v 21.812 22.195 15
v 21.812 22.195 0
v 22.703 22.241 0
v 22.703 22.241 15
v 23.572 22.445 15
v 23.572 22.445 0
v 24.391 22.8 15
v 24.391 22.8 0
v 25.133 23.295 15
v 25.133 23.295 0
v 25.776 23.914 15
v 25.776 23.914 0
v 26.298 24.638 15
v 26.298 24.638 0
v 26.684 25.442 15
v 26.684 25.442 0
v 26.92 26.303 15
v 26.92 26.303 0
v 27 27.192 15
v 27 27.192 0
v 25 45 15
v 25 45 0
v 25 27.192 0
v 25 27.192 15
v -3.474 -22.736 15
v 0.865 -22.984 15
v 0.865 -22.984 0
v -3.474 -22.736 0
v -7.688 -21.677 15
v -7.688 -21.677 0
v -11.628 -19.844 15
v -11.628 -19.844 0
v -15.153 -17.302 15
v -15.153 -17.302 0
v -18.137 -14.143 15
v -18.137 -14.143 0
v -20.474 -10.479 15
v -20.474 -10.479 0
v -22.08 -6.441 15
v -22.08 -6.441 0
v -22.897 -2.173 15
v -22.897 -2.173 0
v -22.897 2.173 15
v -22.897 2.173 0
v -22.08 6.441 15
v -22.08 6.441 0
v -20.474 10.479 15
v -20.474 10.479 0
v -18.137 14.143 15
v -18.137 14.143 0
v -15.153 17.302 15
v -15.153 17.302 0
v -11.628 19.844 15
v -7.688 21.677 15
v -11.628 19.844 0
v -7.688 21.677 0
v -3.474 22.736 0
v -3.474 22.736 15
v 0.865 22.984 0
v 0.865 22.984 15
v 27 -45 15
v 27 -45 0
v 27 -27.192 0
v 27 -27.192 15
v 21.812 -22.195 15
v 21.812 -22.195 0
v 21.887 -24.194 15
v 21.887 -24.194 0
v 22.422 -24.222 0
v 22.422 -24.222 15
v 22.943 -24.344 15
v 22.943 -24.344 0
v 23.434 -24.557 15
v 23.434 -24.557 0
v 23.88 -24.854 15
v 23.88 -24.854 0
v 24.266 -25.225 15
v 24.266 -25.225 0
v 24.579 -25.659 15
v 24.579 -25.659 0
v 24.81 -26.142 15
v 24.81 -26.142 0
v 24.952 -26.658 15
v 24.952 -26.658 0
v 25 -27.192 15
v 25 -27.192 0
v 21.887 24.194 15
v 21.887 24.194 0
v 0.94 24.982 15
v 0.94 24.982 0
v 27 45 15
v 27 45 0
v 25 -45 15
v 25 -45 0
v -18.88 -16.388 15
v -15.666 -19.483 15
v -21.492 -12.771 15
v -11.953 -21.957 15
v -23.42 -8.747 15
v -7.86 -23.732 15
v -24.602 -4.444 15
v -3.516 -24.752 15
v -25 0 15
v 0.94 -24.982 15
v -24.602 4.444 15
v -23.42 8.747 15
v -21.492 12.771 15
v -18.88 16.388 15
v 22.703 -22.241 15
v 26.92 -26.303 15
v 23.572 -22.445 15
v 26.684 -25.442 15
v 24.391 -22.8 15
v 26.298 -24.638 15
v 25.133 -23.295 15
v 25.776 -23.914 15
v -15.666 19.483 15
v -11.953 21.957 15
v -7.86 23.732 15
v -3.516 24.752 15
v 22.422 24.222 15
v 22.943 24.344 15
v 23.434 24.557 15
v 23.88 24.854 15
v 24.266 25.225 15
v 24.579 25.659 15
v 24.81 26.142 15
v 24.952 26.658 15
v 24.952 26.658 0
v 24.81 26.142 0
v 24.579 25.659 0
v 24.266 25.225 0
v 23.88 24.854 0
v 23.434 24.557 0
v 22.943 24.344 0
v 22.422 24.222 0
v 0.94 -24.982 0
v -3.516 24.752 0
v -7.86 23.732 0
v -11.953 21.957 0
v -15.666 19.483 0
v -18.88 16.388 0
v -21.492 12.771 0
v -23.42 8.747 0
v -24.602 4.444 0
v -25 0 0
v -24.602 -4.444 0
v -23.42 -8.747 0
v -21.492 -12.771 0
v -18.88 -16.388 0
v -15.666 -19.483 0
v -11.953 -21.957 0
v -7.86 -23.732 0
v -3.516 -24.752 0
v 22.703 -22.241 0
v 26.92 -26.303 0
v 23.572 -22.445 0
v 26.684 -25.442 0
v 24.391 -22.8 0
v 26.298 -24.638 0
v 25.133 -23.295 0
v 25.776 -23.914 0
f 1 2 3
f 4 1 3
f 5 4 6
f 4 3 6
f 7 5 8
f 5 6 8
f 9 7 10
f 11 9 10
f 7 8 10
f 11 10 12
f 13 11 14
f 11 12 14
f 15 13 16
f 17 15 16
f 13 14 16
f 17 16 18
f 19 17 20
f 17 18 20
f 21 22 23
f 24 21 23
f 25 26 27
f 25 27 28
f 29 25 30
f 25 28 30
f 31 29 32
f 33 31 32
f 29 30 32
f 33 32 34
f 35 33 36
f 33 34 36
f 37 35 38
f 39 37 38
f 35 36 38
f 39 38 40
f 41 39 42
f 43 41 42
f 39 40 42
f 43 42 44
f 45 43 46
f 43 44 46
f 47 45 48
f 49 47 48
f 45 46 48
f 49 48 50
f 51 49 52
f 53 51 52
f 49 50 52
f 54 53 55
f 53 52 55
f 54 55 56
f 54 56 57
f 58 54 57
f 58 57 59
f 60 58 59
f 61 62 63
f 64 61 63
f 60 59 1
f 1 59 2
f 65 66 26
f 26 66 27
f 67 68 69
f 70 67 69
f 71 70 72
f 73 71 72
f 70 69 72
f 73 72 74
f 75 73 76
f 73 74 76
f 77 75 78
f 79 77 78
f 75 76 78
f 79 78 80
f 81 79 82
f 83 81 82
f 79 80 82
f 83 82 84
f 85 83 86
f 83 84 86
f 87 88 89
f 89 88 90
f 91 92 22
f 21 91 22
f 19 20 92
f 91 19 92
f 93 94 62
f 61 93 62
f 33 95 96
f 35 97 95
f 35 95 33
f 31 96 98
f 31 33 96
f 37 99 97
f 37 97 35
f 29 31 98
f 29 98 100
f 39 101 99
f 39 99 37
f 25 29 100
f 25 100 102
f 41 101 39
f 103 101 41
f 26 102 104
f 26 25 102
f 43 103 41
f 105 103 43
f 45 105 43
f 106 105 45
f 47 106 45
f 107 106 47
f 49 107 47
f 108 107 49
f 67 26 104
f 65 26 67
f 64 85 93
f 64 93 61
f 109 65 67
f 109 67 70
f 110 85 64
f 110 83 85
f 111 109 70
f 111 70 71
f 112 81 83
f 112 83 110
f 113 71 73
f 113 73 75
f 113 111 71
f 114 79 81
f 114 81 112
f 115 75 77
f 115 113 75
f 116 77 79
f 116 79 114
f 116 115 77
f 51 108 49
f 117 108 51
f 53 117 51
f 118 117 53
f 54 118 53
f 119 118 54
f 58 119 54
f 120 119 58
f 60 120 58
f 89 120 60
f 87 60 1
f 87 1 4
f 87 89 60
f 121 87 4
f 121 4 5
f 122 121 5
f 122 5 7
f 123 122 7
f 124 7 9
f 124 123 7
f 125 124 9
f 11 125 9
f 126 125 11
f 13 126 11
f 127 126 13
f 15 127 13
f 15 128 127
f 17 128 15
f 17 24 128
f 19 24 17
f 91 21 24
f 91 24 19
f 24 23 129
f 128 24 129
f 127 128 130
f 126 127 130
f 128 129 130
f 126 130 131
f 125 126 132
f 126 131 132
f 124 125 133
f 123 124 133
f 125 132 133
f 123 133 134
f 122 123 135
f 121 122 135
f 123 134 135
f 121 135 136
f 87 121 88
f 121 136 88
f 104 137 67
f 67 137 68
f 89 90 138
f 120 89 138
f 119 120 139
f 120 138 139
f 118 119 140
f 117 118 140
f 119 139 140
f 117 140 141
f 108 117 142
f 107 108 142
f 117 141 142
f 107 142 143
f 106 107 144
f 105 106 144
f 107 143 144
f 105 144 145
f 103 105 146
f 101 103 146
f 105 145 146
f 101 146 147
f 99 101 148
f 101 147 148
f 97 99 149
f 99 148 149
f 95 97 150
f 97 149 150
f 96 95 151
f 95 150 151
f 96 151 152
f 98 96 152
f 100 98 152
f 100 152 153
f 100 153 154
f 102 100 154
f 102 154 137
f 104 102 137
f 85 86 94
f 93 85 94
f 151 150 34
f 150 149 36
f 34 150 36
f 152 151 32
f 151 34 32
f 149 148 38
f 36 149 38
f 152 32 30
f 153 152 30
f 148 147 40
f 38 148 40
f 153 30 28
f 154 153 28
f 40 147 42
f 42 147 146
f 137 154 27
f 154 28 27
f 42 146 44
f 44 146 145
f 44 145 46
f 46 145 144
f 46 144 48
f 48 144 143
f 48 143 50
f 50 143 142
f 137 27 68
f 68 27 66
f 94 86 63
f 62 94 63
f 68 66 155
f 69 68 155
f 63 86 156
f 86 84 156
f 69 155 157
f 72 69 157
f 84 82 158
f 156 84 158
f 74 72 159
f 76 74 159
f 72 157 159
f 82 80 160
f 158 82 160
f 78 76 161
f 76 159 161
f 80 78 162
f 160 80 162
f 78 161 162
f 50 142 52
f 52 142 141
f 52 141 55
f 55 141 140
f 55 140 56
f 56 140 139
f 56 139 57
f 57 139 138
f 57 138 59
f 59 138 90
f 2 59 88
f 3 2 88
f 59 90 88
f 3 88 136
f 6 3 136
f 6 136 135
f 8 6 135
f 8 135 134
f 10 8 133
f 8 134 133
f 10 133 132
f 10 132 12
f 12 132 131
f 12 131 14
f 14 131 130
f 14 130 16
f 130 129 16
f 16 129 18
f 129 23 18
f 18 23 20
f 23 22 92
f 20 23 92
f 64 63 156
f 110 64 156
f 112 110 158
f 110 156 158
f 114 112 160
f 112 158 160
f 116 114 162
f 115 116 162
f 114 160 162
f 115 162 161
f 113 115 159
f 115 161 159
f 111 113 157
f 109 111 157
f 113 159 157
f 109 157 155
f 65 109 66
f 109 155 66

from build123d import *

# Parameters (mm, degrees)
F1_DEPTH = 15


with BuildPart() as f1:
    # F0 (on Top) → F1 (new body)
    with BuildSketch(Plane.XY):
        with BuildLine():
            ThreePointArc((0.865114, -22.983724), (-23, 0), (0.865114, 22.983724))
            Line((0.865114, 22.983724), (21.811932, 22.19528))
            ThreePointArc((21.811932, 22.19528), (25.468404, 23.59033), (27, 27.191742))
            Line((27, 27.191742), (27, 45))
            Line((27, 45), (25, 45))
            Line((25, 45), (25, 27.191742))
            ThreePointArc((25, 27.191742), (24.081043, 25.030895), (21.887159, 24.193865))
            Line((21.887159, 24.193865), (0.940341, 24.982309))
            ThreePointArc((0.940341, 24.982309), (-25, 0), (0.940341, -24.982309))
            Line((0.940341, -24.982309), (21.887159, -24.193865))
            ThreePointArc((21.887159, -24.193865), (24.081043, -25.030895), (25, -27.191742))
            Line((25, -27.191742), (25, -45))
            Line((25, -45), (27, -45))
            Line((27, -45), (27, -27.191742))
            ThreePointArc((27, -27.191742), (25.468404, -23.59033), (21.811932, -22.19528))
            Line((21.811932, -22.19528), (0.865114, -22.983724))
        make_face()
    extrude(amount=F1_DEPTH)


solid = f1.part
